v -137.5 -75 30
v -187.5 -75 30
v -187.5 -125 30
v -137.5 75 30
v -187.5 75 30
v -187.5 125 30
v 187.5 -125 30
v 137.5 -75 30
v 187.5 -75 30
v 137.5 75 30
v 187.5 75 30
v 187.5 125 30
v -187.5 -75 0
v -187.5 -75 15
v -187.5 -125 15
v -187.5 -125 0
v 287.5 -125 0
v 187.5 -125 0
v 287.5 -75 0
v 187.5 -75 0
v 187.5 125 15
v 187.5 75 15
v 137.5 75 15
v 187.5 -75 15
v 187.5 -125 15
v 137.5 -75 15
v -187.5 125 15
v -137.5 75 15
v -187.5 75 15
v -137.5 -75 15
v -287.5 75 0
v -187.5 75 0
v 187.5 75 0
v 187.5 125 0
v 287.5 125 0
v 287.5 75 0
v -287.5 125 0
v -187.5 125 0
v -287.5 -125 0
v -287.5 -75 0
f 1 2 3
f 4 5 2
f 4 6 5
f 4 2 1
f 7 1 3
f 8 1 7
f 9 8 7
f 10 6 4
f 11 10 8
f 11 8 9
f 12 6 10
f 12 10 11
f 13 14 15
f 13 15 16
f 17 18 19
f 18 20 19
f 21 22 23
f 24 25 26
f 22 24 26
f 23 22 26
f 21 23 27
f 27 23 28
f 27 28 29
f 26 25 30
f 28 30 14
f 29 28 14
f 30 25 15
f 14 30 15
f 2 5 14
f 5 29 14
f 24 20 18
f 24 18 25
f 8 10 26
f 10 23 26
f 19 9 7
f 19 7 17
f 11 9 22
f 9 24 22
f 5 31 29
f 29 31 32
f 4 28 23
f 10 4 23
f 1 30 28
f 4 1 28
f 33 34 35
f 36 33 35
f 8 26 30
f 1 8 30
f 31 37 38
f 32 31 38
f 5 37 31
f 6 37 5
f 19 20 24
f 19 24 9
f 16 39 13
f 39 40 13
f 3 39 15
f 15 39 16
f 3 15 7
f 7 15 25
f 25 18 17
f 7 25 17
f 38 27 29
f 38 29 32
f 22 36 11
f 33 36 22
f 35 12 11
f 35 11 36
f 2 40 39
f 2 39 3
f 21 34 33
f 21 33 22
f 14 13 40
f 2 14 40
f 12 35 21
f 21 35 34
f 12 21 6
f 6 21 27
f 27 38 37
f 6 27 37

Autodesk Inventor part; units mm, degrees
ref_plane "YZ Plane" through (0, 0, 0) normal (1, 0, 0) x (0, 1, 0)
ref_plane "XZ Plane" through (0, 0, 0) normal (0, 1, 0) x (-1, 0, 0)
sketch "Sketch1" plane through (0, 0, 0) normal (0, 0, 1) x (1, 0, 0)
  line L0 (137.5, -75) -> (-137.5, -75)
  line L1 (-137.5, -75) -> (-137.5, 75)
  line L2 (-137.5, 75) -> (137.5, 75)
  line L3 (137.5, 75) -> (137.5, -75)
  line L4 (137.5, -75) -> (-137.5, 75) construction
  line L5 (-137.5, -75) -> (137.5, 75) construction
  line L6 (187.5, 125) -> (-187.5, 125)
  line L7 (-187.5, 125) -> (-187.5, -125)
  line L8 (-187.5, -125) -> (187.5, -125)
  line L9 (187.5, -125) -> (187.5, 125)
  line L10 (-187.5, 125) -> (-287.5, 125)
  line L11 (-287.5, 125) -> (-287.5, 75)
  line L12 (-287.5, 75) -> (-187.5, 75)
  line L13 (-187.5, 75) -> (-187.5, 125)
  line L14 (-187.5, -75) -> (-287.5, -75)
  line L15 (-287.5, -75) -> (-287.5, -125)
  line L16 (-287.5, -125) -> (-187.5, -125)
  line L17 (-187.5, -125) -> (-187.5, -75)
  line L18 (0, 175) -> (0, -175) construction
  line L19 (-1719.5601, 0) -> (1799.9601, 0) construction
  line L20 (187.5, 125) -> (287.5, 125)
  line L21 (287.5, 125) -> (287.5, 75)
  line L22 (287.5, 75) -> (187.5, 75)
  line L23 (187.5, -75) -> (287.5, -75)
  line L24 (287.5, -75) -> (287.5, -125)
  line L25 (287.5, -125) -> (187.5, -125)
  line L26 (1719.5601, 0) -> (-1799.9601, 0) construction
  point P0 (0, 0)
  point P1 (237.5, -125)
  point P2 (0, -125)
  point P3 (-237.5, 125)
  point P4 (0, 125)
  point P5 (237.5, 125)
  point P6 (-237.5, -125)
  point P7 (-237.5, -75)
  point P8 (0, -75)
  point P9 (-237.5, 75)
  point P10 (0, 75)
  point P11 (-287.5, 100)
  point P12 (-287.5, -100)
  point P13 (287.5, 100)
  point P14 (287.5, -100)
  point P15 (187.5, 75)
  dimension "d0" = 50
  dimension "d1" = 150
  dimension "d2" = 275
  dimension "d3" = 100
extrude "Extrusion1" add sketch "Sketch1" along normal blind 30
ref_plane "Work Plane1" through (-287.5, 0, 0) normal (0, -1, 0) x (1, 0, 0)
sketch "Sketch2" plane through (-287.5, 0, 0) normal (0, -1, 0) x (1, 0, 0)
  line L0 (475, 30) -> (475, 0) construction
  line L1 (475, 0) -> (425, 0) construction
  line L2 (425, 0) -> (425, 30) construction
  line L3 (425, 30) -> (475, 30) construction
  line L4 (100, 0) -> (100, 30) construction
  line L5 (100, 30) -> (150, 30) construction
  line L6 (150, 30) -> (150, 0) construction
  line L7 (150, 0) -> (100, 0) construction
  line L8 (475, 30) -> (475, 0) construction
  line L9 (475, 0) -> (425, 0) construction
  line L10 (425, 0) -> (425, 30) construction
  line L11 (100, 0) -> (100, 30) construction
  line L12 (150, 30) -> (150, 0) construction
  line L13 (150, 0) -> (100, 0) construction
  line L14 (0, 0) -> (100, 0) construction
  line L15 (100, 0) -> (100, 30) construction
  line L16 (0, 30) -> (100, 30) construction
  line L17 (0, 0) -> (0, 30) construction
  line L18 (150, 0) -> (425, 0) construction
  line L19 (425, 0) -> (425, 30) construction
  line L20 (150, 30) -> (425, 30) construction
  line L21 (150, 0) -> (150, 30) construction
  line L22 (475, 0) -> (575, 0) construction
  line L23 (575, 0) -> (575, 30) construction
  line L24 (475, 30) -> (575, 30) construction
  line L25 (475, 0) -> (475, 30) construction
  line L26 (0, 0) -> (0, 30) projected
  line L27 (0, 0) -> (100, 30)
  line L28 (475, 30) -> (575, 0)
  line L29 (425, 30) -> (475, 30) projected
  line L30 (100, 30) -> (150, 30) projected
  line L31 (0, 0) -> (100, 0)
  line L32 (100, 30) -> (100, 0)
  line L33 (475, 30) -> (475, 0)
  line L34 (575, 0) -> (0, 0) projected
  line L35 (575, 0) -> (475, 0)
  line L36 (0, 30) -> (100, 30)
  line L37 (100, 30) -> (100, 0)
  line L38 (100, 0) -> (0, 0)
  line L39 (0, 0) -> (0, 30)
  line L40 (475, 30) -> (575, 30)
  line L41 (575, 30) -> (575, 0)
  line L42 (575, 0) -> (475, 0)
  line L43 (475, 0) -> (475, 30)
  point P0 (287.5, 0)
extrude "Extrusion2" cut sketch "Sketch2" along normal through all both and the other way through all contours L26 L36 L27 | L40 L41 L28
sketch "Sketch3" plane through (-287.5, -125, 0) normal (0, -1, 0) x (1, 0, 0)
  line L0 (475, 0) -> (475, 30) projected
  line L1 (100, 0) -> (475, 0)
  line L2 (475, 0) -> (475, 15)
  line L3 (475, 15) -> (100, 15)
  line L4 (100, 15) -> (100, 0)
  line L5 (0, 0) -> (575, 0) projected
  point P0 (287.5, 0)
  point P1 (287.5, 0)
extrude "Extrusion3" cut sketch "Sketch3" against normal through all
ref_plane "Work Plane2" through (-187.5, 0, 30) normal (0, -1, 0) x (1, 0, 0)
ref_plane "Work Plane3" through (0, -75, 30) normal (1, 0, 0) x (0, 0, -1)
properties part number "Base_plartform" material "Stainless Steel"
